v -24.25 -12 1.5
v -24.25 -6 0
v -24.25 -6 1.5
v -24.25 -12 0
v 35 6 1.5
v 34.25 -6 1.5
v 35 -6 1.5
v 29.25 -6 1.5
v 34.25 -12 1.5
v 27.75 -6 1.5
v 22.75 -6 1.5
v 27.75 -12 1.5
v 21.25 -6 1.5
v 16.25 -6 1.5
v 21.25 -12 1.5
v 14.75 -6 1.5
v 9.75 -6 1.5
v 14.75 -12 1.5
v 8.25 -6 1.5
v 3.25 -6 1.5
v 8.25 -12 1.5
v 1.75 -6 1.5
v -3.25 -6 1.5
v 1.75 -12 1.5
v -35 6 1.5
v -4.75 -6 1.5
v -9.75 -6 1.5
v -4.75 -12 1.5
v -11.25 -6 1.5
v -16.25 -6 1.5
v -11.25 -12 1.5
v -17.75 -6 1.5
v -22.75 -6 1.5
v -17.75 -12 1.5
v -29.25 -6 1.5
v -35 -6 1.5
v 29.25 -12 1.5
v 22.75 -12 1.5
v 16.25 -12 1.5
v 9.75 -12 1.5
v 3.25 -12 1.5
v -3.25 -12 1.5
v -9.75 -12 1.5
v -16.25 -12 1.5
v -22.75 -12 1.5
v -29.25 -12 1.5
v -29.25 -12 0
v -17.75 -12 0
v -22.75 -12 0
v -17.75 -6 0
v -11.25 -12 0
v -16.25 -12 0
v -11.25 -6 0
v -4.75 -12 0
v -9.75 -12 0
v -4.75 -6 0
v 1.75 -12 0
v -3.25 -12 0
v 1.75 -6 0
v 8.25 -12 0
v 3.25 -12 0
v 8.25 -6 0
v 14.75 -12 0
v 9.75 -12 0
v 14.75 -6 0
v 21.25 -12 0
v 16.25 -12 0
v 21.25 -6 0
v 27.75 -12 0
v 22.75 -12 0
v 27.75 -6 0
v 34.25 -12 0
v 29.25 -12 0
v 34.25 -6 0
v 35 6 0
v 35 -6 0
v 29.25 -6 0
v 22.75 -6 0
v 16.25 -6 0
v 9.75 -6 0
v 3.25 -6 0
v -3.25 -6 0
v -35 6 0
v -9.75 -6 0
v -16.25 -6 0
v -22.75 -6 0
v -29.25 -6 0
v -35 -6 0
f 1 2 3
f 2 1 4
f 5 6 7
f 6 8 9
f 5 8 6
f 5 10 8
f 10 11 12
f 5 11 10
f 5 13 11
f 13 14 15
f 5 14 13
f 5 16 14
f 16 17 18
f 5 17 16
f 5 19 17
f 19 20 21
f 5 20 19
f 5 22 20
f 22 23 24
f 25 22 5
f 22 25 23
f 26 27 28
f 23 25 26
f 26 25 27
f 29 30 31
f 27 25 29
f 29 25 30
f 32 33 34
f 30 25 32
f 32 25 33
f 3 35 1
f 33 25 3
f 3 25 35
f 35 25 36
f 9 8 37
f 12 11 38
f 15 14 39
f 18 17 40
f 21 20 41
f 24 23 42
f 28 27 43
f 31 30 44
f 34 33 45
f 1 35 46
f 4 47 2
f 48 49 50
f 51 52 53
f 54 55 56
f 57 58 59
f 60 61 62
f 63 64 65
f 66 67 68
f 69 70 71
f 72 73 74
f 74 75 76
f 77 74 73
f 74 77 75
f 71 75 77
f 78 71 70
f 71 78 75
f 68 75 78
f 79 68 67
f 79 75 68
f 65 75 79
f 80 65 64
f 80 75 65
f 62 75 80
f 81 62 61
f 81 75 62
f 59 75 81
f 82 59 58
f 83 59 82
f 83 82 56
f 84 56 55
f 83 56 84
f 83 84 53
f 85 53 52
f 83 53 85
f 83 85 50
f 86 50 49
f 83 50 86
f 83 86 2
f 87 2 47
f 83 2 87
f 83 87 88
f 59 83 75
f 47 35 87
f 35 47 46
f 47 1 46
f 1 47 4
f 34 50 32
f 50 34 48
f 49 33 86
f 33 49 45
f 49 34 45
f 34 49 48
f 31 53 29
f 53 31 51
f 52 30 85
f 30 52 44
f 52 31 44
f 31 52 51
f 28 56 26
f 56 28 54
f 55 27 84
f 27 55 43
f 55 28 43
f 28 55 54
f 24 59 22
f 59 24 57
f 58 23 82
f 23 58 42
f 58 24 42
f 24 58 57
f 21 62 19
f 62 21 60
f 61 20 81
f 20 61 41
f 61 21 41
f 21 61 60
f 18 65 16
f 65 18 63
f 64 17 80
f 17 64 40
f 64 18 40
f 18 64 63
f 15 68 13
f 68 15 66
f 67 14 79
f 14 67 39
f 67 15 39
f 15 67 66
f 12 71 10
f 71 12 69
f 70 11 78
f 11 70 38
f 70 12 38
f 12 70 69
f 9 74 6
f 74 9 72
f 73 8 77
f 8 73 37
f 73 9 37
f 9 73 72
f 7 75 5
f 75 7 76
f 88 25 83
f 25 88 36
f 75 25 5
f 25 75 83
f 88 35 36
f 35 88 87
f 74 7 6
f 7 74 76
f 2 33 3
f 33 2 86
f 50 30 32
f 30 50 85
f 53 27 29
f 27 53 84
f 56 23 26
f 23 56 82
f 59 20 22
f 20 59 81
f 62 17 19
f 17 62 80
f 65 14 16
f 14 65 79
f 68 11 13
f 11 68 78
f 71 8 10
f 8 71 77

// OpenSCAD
// 10-well agarose gel casting comb
// Print orientation: flat on bed, teeth pointing down (-Y)

$fn = 64;

// ---- Dimensions (mm) ----
plate_t      = 1.5;   // plate thickness (Z)
spine_l      = 70;    // spine length (X)
spine_w      = 12;    // spine width (Y)
tooth_w      = 5.0;   // tooth width (X)
tooth_l      = 12;    // tooth length (Y)
tooth_count  = 10;    // number of teeth
tooth_gap    = 1.5;   // gap between neighbouring teeth (X)
overhang     = 0.5;   // extra length so teeth pass through the plate

// ---- Derived ----
pitch   = tooth_w + tooth_gap;            // centre-to-centre spacing
x_start = -(tooth_count - 1) * pitch / 2; // first tooth centre (row centred)

// ---- Model ----
union() {
    // Spine (back bar)
    translate([-spine_l / 2, -spine_w / 2, 0])
        cube([spine_l, spine_w, plate_t]);

    // Teeth
    for (i = [0 : tooth_count - 1])
        translate([x_start + i * pitch, -tooth_l, 0])
            cube([tooth_w, tooth_l + overhang, plate_t]);
}
